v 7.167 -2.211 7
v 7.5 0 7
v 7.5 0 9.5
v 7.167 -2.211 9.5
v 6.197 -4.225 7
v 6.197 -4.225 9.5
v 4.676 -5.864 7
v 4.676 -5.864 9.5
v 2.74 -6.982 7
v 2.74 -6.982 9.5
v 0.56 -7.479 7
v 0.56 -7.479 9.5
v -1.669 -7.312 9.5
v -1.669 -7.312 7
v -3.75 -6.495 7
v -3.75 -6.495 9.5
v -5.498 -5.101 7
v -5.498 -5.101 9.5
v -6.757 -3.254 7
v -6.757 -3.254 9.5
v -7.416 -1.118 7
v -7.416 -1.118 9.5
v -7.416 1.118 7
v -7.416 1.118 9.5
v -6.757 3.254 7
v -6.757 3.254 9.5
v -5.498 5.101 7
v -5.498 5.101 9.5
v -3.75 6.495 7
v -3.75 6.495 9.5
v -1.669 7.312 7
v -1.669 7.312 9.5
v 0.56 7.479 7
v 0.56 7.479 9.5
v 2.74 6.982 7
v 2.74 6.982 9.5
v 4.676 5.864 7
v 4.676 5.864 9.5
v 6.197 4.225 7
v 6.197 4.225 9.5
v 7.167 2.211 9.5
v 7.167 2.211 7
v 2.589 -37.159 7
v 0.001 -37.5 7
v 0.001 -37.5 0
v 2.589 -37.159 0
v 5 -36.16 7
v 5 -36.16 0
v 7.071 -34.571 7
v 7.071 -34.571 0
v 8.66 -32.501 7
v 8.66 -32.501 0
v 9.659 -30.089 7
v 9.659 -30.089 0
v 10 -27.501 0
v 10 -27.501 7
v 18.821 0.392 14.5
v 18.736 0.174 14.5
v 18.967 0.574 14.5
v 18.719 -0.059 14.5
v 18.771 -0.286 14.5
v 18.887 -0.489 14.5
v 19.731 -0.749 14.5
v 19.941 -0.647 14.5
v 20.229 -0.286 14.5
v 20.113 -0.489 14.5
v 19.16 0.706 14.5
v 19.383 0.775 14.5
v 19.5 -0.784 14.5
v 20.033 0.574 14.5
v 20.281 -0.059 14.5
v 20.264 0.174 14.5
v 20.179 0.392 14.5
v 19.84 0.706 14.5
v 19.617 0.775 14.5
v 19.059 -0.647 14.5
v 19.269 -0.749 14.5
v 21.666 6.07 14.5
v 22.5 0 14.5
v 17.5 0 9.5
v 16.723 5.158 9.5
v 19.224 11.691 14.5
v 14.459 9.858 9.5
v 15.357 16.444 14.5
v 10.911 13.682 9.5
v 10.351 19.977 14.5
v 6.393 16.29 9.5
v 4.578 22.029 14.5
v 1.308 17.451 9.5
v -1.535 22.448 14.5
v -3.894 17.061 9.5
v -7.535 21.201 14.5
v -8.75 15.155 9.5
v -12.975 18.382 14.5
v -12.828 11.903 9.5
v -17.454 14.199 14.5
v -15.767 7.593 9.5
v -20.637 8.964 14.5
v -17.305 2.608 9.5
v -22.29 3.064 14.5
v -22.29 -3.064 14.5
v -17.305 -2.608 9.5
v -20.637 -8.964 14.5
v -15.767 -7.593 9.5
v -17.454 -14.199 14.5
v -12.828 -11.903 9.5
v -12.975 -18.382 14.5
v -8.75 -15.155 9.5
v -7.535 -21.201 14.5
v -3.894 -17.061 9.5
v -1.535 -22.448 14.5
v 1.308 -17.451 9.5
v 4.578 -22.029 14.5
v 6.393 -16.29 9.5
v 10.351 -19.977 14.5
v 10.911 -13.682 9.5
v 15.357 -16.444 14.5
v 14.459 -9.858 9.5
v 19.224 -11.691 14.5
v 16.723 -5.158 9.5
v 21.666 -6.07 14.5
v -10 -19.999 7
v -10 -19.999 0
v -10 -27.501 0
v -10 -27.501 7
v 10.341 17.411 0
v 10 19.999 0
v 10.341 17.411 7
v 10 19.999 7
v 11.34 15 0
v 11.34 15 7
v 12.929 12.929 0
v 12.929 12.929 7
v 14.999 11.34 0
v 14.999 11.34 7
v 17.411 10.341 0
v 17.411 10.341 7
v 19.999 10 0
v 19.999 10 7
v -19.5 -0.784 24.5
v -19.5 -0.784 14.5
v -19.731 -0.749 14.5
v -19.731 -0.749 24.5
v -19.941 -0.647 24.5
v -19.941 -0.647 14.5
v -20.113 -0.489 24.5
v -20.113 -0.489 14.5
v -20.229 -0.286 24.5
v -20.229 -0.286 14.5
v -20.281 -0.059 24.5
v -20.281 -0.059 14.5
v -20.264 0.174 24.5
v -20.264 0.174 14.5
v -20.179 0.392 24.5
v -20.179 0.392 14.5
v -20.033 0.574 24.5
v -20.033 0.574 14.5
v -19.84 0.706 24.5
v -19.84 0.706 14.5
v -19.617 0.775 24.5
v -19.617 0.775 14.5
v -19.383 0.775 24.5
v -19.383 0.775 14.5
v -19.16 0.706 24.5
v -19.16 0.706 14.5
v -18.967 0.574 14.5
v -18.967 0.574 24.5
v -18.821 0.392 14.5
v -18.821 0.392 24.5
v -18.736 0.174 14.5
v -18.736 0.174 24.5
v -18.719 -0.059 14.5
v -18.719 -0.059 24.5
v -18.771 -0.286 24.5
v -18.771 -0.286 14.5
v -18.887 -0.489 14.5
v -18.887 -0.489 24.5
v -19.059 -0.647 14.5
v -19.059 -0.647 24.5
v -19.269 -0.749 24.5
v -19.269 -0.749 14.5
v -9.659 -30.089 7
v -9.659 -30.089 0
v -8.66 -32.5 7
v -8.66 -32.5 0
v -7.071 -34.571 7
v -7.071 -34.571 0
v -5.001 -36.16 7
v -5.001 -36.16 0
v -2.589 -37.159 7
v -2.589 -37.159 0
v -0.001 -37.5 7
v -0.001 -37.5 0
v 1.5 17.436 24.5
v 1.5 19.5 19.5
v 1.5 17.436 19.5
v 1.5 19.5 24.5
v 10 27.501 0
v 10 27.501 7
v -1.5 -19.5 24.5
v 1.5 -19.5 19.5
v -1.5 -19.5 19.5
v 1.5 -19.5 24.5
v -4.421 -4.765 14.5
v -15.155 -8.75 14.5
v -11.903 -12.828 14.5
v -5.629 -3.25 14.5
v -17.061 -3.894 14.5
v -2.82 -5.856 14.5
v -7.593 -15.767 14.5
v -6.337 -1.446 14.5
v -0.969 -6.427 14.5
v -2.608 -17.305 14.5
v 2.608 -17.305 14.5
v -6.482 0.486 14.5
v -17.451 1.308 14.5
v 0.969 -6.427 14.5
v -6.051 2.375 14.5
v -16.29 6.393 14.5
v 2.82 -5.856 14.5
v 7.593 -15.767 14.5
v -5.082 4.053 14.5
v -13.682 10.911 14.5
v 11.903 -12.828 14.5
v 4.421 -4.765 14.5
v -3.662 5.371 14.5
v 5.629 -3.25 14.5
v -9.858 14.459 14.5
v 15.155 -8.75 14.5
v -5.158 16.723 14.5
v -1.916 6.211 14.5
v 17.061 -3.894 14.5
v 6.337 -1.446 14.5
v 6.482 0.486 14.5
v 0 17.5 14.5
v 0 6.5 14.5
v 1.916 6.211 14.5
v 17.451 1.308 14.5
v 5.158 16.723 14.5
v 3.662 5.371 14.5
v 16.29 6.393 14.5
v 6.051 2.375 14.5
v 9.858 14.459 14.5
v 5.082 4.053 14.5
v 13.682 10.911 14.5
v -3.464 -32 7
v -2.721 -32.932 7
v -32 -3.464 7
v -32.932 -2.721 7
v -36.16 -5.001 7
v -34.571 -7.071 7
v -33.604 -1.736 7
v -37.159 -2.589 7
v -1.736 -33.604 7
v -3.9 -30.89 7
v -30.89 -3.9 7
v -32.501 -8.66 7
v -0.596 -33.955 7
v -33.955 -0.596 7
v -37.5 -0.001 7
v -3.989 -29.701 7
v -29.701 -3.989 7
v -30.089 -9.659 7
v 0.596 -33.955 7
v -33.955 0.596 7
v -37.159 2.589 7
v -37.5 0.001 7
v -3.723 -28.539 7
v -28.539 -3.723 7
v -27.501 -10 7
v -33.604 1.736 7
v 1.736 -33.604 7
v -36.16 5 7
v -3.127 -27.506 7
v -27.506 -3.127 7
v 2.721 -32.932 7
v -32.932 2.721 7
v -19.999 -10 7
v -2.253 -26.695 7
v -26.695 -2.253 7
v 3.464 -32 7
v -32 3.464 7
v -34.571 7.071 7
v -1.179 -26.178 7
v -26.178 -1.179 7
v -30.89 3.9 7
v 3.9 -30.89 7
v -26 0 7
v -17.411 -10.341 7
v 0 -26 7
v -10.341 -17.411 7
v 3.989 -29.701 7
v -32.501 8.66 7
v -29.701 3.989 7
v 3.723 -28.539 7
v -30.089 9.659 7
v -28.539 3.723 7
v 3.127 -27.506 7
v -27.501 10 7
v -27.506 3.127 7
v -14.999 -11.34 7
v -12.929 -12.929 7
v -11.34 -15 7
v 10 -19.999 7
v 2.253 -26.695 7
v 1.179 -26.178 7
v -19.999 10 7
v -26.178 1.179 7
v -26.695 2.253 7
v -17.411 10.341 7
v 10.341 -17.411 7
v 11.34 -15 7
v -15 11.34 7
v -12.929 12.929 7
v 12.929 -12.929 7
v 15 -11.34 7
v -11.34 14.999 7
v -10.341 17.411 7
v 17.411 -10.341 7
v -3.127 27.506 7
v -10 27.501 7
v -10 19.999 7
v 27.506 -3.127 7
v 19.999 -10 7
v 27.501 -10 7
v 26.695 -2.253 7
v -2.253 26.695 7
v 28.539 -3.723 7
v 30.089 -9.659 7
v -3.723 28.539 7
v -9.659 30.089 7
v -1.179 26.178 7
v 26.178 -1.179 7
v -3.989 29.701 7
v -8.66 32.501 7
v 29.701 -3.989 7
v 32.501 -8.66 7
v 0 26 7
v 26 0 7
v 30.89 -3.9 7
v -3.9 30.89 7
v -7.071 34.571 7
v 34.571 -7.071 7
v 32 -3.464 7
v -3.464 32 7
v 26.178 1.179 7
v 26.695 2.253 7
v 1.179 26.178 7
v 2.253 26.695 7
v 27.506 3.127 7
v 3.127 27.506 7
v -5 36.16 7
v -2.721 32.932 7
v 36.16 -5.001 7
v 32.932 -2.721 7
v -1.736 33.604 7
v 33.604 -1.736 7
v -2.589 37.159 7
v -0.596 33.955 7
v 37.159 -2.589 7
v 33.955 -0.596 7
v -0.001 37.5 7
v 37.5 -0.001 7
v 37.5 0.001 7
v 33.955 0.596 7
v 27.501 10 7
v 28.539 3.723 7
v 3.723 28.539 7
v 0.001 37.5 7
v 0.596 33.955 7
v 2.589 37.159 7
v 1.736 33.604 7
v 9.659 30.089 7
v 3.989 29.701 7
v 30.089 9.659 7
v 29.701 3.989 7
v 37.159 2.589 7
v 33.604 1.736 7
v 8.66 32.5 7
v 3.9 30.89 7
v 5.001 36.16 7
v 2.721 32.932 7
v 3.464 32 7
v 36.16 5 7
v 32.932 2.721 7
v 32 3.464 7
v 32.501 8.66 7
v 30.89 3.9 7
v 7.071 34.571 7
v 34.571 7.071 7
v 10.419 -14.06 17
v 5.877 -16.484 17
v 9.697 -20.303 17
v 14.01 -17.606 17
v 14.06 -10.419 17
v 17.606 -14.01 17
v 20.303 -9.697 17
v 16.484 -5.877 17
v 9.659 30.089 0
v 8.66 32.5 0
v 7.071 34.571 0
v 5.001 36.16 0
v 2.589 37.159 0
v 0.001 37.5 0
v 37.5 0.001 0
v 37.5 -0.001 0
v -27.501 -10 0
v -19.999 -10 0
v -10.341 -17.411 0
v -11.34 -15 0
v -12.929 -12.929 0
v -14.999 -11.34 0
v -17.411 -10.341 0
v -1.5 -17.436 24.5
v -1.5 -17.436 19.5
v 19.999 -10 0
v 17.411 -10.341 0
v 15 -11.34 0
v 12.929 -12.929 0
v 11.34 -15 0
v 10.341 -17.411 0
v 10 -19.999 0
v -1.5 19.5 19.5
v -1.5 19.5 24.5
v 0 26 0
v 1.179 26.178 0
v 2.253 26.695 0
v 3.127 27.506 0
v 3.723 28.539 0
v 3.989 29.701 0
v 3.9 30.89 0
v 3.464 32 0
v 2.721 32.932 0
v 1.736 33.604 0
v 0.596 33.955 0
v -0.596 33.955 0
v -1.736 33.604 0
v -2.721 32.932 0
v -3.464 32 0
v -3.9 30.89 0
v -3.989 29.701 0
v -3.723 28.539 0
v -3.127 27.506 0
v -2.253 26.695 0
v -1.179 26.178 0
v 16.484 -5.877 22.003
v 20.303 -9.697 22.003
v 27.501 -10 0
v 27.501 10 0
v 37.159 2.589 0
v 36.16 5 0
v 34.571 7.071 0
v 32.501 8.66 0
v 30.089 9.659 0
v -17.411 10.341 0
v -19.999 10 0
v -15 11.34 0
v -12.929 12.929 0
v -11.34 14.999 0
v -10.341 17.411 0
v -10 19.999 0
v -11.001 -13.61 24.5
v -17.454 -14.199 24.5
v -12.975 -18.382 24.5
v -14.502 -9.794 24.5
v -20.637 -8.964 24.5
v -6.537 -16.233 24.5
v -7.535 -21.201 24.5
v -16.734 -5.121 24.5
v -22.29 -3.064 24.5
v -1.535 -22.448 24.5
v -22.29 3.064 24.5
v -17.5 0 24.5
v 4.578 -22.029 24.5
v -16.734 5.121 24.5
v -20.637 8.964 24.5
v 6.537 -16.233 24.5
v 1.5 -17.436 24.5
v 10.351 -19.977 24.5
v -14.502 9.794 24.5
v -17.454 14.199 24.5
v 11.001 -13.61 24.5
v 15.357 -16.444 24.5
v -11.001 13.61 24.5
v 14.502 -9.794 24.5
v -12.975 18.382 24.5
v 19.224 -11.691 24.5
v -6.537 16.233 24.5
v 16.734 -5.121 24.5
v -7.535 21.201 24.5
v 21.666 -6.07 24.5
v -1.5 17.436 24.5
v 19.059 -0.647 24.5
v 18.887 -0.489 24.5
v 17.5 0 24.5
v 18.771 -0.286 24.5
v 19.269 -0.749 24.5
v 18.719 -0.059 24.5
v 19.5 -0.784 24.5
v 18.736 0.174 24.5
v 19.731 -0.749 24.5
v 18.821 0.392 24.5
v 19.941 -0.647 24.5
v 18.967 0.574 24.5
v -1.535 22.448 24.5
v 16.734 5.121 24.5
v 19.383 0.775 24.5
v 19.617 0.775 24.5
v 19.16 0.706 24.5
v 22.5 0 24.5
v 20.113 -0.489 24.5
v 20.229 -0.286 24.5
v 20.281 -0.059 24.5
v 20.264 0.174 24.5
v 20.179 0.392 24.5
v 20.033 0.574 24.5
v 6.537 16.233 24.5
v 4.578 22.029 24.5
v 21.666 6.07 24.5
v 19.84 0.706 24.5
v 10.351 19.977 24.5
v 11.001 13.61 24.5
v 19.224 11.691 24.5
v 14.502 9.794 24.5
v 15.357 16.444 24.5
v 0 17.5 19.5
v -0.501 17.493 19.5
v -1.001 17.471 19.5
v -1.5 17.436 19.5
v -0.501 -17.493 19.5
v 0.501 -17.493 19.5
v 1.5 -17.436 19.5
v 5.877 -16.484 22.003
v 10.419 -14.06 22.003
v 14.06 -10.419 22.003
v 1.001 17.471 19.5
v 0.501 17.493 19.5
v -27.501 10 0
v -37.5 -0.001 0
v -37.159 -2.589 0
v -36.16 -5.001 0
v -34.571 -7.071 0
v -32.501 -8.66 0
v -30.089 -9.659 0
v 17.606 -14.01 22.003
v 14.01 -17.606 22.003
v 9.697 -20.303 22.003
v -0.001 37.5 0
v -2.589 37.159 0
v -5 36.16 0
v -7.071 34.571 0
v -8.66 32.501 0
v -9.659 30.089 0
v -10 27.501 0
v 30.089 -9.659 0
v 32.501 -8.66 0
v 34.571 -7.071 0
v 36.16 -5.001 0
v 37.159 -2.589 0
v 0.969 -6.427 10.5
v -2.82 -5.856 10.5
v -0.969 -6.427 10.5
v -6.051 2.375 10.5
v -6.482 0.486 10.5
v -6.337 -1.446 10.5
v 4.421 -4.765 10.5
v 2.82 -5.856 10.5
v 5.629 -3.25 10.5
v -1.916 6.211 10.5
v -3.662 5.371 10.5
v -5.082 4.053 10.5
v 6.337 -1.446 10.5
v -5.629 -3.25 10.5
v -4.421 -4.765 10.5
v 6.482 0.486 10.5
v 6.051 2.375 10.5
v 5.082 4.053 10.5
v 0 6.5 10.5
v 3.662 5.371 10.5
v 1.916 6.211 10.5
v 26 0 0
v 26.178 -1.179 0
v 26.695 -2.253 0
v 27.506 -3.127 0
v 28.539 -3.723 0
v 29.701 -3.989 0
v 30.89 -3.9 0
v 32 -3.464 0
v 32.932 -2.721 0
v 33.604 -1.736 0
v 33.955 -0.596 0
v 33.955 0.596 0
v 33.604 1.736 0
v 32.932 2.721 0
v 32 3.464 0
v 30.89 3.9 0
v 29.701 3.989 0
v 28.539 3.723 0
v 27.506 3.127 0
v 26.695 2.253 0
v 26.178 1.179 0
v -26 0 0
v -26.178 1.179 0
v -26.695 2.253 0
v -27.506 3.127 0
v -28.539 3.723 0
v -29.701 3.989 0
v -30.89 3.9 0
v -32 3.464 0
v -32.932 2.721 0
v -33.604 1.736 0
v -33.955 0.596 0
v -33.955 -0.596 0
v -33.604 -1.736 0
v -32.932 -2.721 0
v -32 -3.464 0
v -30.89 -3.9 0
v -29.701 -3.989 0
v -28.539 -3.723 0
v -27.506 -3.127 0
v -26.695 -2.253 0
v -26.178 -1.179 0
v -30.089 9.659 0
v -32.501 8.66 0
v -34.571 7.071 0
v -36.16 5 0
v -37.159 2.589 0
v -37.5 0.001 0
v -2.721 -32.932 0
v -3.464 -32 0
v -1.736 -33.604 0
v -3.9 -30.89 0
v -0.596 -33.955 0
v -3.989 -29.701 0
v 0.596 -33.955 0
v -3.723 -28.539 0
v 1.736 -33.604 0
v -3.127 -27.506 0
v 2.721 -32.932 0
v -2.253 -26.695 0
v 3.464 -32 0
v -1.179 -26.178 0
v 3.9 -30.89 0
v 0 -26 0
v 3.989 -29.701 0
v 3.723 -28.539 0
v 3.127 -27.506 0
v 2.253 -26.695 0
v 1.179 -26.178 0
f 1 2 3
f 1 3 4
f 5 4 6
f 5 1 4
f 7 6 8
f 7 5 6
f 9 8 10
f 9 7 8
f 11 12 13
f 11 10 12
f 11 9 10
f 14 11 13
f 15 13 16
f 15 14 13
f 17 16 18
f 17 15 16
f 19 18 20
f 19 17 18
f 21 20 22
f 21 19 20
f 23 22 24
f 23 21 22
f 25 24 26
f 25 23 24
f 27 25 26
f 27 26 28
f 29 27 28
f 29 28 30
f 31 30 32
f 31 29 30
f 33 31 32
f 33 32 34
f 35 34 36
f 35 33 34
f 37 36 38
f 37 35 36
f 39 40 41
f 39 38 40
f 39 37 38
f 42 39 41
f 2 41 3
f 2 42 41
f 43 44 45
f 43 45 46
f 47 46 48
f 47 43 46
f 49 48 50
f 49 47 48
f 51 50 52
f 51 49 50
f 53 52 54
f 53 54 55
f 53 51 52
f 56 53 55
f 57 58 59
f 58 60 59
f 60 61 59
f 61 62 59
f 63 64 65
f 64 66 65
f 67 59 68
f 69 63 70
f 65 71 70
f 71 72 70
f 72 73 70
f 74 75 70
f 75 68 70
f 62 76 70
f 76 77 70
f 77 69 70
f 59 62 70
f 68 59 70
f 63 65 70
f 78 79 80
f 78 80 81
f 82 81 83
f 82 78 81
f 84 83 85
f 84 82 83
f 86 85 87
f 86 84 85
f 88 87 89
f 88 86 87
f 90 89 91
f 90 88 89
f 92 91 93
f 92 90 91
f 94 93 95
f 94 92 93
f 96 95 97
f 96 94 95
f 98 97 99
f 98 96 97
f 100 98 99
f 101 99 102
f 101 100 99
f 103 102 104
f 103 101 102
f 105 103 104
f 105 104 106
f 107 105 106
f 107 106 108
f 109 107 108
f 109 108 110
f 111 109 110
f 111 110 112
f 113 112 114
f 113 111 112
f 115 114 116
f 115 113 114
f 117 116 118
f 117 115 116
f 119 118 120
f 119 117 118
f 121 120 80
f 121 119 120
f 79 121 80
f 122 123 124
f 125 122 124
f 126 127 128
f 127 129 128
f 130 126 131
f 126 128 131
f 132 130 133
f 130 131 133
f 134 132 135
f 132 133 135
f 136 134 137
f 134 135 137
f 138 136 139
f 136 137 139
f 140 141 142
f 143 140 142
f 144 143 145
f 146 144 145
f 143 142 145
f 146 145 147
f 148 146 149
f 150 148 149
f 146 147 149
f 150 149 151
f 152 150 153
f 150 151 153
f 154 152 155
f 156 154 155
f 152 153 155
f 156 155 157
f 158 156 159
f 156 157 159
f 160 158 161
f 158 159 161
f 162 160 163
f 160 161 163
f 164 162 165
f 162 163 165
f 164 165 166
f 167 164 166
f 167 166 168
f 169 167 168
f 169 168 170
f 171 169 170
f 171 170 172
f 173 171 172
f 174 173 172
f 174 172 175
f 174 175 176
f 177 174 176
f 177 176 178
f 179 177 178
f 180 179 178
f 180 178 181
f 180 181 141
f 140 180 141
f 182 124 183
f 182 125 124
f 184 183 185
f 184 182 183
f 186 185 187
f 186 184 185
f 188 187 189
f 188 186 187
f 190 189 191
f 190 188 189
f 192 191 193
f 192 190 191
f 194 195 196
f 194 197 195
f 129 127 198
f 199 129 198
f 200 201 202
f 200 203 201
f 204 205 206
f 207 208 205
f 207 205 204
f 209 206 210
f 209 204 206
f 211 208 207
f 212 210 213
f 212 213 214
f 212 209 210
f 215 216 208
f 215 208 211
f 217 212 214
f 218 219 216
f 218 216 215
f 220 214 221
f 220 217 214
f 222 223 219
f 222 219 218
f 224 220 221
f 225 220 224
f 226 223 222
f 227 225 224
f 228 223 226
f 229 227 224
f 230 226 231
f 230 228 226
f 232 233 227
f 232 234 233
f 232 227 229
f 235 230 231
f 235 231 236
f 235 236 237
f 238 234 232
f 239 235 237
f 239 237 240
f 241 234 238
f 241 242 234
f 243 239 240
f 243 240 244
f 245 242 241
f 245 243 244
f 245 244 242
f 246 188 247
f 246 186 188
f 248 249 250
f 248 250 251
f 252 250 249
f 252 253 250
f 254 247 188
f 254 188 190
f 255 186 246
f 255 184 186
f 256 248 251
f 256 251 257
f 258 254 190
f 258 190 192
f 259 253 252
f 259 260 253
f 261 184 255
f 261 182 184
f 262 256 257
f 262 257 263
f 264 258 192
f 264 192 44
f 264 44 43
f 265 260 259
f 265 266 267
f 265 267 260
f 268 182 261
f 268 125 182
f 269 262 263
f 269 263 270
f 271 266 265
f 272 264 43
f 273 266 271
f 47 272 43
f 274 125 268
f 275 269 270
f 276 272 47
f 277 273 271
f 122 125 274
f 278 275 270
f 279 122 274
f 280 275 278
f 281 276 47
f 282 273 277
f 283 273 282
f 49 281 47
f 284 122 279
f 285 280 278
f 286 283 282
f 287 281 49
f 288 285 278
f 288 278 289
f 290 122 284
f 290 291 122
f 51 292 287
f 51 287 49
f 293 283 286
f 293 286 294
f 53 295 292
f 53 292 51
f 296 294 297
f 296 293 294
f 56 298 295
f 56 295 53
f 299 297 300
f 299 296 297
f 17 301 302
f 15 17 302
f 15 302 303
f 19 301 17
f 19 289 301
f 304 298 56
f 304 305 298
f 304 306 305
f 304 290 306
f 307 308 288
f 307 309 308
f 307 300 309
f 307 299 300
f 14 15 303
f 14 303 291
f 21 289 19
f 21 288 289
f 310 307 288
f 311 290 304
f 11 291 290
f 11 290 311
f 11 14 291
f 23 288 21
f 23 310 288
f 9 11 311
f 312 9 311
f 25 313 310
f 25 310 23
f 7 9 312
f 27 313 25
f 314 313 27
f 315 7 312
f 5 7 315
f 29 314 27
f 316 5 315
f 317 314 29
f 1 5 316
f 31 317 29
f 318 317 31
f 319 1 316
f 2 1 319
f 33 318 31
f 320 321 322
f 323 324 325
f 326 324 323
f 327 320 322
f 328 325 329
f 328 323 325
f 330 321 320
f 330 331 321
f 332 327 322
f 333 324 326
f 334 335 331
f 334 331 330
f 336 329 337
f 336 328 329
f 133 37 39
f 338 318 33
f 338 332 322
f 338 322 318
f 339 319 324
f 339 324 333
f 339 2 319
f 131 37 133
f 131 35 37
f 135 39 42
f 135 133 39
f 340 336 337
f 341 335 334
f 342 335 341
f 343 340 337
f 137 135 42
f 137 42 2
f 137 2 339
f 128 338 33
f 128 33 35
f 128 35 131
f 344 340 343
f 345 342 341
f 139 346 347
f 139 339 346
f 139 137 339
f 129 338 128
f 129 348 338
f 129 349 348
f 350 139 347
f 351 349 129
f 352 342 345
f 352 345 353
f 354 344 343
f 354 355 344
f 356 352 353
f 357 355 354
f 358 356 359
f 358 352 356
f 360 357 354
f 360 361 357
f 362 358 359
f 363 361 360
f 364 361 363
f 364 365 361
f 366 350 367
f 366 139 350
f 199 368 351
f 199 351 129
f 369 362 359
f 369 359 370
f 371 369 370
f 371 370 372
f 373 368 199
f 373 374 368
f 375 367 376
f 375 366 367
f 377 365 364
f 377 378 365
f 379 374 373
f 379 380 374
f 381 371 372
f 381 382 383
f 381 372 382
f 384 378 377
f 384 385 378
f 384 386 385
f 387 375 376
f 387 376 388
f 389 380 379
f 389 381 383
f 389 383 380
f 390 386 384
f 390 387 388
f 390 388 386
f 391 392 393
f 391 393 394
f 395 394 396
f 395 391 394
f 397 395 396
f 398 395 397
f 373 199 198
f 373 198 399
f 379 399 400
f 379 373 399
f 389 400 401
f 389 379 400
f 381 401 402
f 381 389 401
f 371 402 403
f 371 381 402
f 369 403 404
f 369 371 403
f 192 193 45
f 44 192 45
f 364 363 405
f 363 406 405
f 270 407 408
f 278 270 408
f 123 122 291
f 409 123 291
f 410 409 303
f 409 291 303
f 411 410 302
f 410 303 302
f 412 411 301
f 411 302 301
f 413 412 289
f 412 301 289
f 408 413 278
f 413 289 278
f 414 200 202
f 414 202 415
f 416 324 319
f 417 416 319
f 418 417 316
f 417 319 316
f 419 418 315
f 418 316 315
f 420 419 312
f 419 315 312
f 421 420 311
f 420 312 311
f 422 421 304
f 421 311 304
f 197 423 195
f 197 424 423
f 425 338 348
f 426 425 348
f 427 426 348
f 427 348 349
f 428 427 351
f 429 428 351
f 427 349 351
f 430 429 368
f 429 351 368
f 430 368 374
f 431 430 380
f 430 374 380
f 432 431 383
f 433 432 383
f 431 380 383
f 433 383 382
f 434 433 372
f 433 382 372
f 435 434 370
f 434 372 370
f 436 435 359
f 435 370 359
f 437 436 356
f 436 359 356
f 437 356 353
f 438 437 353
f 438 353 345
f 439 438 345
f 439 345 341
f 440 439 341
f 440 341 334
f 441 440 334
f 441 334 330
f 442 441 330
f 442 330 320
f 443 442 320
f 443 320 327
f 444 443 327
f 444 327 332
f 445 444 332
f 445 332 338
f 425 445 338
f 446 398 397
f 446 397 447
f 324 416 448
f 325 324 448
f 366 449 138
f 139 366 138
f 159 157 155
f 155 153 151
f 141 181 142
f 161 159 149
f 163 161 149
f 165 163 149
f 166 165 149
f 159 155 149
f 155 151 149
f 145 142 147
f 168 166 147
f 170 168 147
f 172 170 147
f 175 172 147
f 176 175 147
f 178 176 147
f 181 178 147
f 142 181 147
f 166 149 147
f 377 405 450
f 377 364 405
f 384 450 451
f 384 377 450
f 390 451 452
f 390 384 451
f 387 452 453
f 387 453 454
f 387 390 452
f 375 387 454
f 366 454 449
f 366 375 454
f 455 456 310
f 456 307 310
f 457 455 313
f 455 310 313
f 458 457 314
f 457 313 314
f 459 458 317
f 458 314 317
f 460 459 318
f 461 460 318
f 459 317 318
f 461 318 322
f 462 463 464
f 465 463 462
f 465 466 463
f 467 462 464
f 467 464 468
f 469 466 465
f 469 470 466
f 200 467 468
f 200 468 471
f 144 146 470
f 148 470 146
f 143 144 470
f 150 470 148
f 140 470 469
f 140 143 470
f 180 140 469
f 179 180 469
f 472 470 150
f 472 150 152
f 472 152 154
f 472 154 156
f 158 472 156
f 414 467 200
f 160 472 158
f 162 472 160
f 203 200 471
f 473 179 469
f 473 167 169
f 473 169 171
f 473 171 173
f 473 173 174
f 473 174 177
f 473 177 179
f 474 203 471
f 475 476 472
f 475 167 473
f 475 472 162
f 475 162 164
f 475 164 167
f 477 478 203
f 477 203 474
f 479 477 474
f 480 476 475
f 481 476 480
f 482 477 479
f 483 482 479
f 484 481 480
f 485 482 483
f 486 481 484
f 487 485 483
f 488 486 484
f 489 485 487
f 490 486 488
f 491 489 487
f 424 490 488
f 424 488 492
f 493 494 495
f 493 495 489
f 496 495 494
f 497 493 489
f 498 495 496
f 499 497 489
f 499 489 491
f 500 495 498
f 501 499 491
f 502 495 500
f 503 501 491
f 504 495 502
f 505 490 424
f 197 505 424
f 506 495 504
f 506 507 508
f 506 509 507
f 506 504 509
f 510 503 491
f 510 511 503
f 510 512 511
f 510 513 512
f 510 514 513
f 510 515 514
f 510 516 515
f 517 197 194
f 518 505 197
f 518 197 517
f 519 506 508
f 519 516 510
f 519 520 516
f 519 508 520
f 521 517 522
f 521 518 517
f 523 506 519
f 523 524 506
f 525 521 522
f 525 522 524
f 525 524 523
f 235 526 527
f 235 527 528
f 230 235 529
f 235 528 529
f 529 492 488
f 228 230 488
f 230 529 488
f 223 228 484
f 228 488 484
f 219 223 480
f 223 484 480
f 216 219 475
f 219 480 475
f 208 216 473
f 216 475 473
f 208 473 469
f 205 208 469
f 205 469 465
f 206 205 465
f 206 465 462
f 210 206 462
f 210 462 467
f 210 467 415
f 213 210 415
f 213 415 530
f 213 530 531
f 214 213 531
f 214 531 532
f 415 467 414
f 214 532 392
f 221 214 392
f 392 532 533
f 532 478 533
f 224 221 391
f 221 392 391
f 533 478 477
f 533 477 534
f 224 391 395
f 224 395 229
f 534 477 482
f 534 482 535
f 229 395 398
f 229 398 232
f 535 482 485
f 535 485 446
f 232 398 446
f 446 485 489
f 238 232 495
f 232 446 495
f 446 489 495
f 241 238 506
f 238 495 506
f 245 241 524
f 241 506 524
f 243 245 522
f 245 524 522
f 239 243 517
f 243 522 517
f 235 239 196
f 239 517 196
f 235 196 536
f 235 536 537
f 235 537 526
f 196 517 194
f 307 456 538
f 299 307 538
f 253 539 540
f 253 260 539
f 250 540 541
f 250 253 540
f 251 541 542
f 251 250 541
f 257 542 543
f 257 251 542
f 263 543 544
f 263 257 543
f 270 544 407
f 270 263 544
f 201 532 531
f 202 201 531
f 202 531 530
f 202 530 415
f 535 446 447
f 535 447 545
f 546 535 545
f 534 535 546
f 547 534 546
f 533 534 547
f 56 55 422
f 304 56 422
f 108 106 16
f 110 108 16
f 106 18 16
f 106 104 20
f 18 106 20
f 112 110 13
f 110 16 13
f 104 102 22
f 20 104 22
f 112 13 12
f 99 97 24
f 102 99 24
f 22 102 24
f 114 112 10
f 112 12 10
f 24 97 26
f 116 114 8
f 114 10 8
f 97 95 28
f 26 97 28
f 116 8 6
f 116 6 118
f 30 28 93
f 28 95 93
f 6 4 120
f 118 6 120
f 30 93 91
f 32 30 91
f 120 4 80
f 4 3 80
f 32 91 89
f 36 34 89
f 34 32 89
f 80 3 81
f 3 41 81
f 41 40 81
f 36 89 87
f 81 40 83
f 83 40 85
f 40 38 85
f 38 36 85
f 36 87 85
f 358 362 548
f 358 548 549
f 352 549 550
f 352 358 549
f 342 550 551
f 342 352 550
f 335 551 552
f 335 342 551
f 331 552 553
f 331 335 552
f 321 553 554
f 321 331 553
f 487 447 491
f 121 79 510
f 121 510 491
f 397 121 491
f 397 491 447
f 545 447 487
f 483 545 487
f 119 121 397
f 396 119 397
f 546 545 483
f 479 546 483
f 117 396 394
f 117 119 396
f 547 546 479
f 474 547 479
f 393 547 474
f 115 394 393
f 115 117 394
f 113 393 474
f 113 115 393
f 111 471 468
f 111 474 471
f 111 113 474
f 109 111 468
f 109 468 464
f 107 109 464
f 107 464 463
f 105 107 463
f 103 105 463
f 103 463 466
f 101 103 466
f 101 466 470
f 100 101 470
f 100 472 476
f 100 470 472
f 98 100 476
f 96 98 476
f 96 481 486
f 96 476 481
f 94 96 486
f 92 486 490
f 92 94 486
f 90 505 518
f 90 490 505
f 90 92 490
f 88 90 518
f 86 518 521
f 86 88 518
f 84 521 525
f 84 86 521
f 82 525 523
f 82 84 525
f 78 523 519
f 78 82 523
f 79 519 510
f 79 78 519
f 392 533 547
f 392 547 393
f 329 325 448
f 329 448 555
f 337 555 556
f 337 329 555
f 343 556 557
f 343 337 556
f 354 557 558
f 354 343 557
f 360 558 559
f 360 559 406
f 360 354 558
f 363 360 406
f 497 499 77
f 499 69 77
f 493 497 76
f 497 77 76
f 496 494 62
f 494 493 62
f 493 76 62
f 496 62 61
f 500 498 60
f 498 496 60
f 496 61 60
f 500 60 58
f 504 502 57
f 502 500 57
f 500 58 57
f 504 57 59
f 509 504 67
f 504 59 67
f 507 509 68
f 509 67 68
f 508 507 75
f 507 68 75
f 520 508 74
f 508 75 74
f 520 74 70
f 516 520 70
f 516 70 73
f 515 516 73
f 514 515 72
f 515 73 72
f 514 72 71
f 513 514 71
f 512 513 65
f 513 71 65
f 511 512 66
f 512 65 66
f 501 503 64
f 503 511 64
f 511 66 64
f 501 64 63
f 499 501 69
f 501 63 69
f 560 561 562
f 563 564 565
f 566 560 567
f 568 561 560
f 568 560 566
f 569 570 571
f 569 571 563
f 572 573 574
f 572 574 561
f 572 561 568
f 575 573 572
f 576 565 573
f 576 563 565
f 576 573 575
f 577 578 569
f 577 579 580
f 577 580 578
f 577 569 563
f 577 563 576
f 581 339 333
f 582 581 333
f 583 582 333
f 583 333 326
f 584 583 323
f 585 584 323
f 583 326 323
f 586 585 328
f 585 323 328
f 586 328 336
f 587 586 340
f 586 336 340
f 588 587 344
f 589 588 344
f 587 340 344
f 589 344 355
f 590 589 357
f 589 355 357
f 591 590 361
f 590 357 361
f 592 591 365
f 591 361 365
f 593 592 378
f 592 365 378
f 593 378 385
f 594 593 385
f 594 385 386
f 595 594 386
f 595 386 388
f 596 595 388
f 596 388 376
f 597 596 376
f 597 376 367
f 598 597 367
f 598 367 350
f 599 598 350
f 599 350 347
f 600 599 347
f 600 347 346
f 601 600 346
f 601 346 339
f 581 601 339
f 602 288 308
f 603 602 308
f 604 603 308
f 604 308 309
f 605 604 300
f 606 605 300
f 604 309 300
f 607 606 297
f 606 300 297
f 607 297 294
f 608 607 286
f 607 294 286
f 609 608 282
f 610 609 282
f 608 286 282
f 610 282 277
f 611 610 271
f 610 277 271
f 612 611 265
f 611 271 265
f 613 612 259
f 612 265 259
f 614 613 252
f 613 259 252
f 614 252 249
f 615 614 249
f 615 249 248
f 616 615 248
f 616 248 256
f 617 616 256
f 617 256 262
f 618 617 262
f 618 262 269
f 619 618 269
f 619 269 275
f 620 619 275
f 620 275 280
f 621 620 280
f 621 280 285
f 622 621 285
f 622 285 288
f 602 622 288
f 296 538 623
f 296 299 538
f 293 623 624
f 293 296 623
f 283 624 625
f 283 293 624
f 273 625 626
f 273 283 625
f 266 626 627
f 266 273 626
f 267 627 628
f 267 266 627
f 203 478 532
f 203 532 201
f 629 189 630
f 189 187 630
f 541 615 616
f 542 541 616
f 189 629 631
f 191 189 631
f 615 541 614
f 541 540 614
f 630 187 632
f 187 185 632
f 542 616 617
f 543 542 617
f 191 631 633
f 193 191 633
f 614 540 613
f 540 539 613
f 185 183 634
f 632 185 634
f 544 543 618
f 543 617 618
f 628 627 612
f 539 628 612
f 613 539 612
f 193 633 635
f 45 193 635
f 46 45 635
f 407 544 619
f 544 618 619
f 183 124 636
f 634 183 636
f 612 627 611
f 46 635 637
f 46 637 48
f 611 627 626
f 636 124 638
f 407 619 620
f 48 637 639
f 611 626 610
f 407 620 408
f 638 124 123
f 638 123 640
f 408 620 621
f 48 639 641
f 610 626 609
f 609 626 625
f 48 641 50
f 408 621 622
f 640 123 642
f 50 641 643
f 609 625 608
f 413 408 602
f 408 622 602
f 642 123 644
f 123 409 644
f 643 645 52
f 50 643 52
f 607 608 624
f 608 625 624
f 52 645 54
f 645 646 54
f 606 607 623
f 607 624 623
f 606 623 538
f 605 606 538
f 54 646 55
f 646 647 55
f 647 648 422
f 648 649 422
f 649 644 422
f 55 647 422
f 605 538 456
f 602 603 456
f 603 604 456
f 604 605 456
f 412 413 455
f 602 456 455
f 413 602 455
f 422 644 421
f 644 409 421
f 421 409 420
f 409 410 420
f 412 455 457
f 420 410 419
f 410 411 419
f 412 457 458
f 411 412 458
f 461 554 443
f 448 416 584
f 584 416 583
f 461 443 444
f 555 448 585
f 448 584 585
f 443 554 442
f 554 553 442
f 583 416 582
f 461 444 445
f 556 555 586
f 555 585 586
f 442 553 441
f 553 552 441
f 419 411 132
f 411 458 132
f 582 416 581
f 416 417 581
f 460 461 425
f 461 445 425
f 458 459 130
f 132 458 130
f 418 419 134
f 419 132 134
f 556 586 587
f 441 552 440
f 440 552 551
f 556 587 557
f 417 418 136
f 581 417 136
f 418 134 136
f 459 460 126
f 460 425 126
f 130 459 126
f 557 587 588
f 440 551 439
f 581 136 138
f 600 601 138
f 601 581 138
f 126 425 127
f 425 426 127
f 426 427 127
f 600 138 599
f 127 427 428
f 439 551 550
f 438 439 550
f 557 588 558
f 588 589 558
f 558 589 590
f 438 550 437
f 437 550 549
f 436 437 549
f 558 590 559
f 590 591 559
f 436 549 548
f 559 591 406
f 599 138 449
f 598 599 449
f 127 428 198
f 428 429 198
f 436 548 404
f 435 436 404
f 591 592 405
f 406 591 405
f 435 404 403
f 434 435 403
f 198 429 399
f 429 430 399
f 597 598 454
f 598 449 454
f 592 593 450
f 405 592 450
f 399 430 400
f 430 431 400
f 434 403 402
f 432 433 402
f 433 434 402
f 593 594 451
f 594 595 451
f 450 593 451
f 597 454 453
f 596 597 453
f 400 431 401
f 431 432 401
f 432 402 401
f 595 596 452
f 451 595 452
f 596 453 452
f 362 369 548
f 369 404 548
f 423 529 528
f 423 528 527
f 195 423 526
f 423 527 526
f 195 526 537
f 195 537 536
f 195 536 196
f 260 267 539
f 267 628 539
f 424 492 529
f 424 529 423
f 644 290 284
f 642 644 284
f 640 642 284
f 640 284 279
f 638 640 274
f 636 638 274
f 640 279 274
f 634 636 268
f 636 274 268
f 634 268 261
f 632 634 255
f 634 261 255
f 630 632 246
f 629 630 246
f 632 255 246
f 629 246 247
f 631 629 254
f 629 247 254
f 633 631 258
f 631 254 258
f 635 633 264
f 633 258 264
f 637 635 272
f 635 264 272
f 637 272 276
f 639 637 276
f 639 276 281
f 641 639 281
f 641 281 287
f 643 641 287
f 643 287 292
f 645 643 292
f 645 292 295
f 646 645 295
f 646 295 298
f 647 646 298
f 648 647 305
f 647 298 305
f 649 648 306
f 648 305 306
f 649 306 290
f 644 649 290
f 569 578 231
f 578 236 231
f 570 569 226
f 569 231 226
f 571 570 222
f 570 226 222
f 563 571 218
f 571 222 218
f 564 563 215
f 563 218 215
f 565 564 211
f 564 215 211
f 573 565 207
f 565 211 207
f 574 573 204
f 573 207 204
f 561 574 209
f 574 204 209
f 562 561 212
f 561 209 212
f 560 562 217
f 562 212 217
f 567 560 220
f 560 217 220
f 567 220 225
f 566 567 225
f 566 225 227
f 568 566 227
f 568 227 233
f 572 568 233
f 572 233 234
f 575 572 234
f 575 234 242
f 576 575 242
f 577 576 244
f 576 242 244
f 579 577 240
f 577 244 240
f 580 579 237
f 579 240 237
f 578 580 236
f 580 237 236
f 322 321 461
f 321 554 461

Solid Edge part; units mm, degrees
sketch "Sketch1" plane through (0, 0, 0) normal (0, 0, 1) x (1, 0, 0)
  line L0 (-37.5, -10) -> (-10, -10)
  line L1 (-10, -10) -> (-10, -37.5)
  line L2 (-10, -37.5) -> (10, -37.5)
  line L3 (10, -37.5) -> (10, -10)
  line L4 (10, -10) -> (37.5, -10)
  line L5 (37.5, -10) -> (37.5, 10)
  line L6 (37.5, 10) -> (10, 10)
  line L7 (10, 10) -> (10, 37.5)
  line L8 (10, 37.5) -> (-10, 37.5)
  line L9 (-10, 37.5) -> (-10, 10)
  line L10 (-10, 10) -> (-37.5, 10)
  line L11 (-37.5, 10) -> (-37.5, -10)
extrude "Protrusion1" add sketch "Sketch1" along normal blind 7
sketch "Sketch2" plane through (0, 0, 7) normal (0, 0, 1) x (1, 0, 0)
  circle A0 centre (0, 0) radius 7.5
  dimension "D1" = 15
extrude "Protrusione_Inferiore" add sketch "Sketch2" along normal blind 2.5
sketch "Sketch3" plane through (0, 0, 9.5) normal (0, 0, 1) x (1, 0, 0)
  circle A0 centre (0, 0) radius 22.5
  dimension "D1" = 45
extrude "Protrusione_Centrale" add sketch "Sketch3" along normal blind 15
chamfer "Smusso_1" distance 5 angle 45 1 edges at (-22.5, 0, 9.5)
fillet "Rotondo_1" radius 10 12 edges at (37.5, 10, 3.5) (10, 10, 3.5) (10, 37.5, 3.5) (-10, 37.5, 3.5) (-10, 10, 3.5) (-37.5, 10, 3.5) (-37.5, -10, 3.5) (-10, -10, 3.5) (-10, -37.5, 3.5) (10, -37.5, 3.5) (10, -10, 3.5) (37.5, -10, 3.5)
sketch "Sketch4" plane through (0, 0, 7) normal (0, 0, 1) x (1, 0, 0)
  circle A0 centre (-30, 0) radius 4
  dimension "D1" = 8
  dimension "D2" = 30
extrude "Cutout1" cut sketch "Sketch4" against normal up to next
pattern_circular "Pattern1" count 4 over 360 about axis through (0, 0, 7) along (0, 0, -1) of "Cutout1"
sketch "Sketch5" plane through (0, 0, 24.5) normal (0, 0, 1) x (0, 1, 0)
  circle A0 centre (0, 0) radius 17.5
  dimension "D1" = 35
extrude "Cutout2" cut sketch "Sketch5" against normal up to vertex (10 mm away)
sketch "Sketch6" plane through (0, 0, 0) normal (0.7071, -0.7071, 0) x (0.7071, 0.7071, 0)
  line L0 (-7.5, 17) -> (7.5, 17)
  line L1 (7.5, 17) -> (7.5, 22.0033)
  line L2 (7.5, 22.0033) -> (-7.5, 22.0033)
  line L3 (-7.5, 22.0033) -> (-7.5, 17)
  dimension "D1" = 5.0033
  dimension "D2" = 15
  dimension "D3" = 2.5
extrude "Scavo_collegamenti_Profile_Plane1" cut sketch "Sketch6" along normal through all
sketch "Sketch7" plane through (0, 0, 24.5) normal (0, 0, 1) x (0, 1, 0)
  line L0 (-12.5, -1.5) -> (-19.5, -1.5)
  line L1 (-19.5, -1.5) -> (-19.5, 1.5)
  line L2 (-19.5, 1.5) -> (-12.5, 1.5)
  line L3 (-12.5, 1.5) -> (-12.5, -1.5)
  dimension "D1" = 3
  dimension "D2" = 19.5
  dimension "D3" = 7
extrude "Scavo_per_sostegno_bobine" cut sketch "Sketch7" against normal blind 5
mirror "Mirror1" about plane through (0, 0, 0) normal (0, -1, 0) of "Scavo_per_sostegno_bobine"
hole "Foro_1" at (-19.5, 0, 24.5) direction (0, 0, -1) diameter 1.567 depth 10 thread major 2 thread length 7
mirror "Mirror2" about plane through (0, 0, 0) normal (1, 0, 0) of "Foro_1"
sketch "Sketch8" plane through (0, 0, 14.5) normal (0, 0, 1) x (0, 1, 0)
  circle A0 centre (0, 0) radius 6.5
  dimension "D1" = 13
extrude "ScavoEstrusione_5" cut sketch "Sketch8" against normal blind 4
